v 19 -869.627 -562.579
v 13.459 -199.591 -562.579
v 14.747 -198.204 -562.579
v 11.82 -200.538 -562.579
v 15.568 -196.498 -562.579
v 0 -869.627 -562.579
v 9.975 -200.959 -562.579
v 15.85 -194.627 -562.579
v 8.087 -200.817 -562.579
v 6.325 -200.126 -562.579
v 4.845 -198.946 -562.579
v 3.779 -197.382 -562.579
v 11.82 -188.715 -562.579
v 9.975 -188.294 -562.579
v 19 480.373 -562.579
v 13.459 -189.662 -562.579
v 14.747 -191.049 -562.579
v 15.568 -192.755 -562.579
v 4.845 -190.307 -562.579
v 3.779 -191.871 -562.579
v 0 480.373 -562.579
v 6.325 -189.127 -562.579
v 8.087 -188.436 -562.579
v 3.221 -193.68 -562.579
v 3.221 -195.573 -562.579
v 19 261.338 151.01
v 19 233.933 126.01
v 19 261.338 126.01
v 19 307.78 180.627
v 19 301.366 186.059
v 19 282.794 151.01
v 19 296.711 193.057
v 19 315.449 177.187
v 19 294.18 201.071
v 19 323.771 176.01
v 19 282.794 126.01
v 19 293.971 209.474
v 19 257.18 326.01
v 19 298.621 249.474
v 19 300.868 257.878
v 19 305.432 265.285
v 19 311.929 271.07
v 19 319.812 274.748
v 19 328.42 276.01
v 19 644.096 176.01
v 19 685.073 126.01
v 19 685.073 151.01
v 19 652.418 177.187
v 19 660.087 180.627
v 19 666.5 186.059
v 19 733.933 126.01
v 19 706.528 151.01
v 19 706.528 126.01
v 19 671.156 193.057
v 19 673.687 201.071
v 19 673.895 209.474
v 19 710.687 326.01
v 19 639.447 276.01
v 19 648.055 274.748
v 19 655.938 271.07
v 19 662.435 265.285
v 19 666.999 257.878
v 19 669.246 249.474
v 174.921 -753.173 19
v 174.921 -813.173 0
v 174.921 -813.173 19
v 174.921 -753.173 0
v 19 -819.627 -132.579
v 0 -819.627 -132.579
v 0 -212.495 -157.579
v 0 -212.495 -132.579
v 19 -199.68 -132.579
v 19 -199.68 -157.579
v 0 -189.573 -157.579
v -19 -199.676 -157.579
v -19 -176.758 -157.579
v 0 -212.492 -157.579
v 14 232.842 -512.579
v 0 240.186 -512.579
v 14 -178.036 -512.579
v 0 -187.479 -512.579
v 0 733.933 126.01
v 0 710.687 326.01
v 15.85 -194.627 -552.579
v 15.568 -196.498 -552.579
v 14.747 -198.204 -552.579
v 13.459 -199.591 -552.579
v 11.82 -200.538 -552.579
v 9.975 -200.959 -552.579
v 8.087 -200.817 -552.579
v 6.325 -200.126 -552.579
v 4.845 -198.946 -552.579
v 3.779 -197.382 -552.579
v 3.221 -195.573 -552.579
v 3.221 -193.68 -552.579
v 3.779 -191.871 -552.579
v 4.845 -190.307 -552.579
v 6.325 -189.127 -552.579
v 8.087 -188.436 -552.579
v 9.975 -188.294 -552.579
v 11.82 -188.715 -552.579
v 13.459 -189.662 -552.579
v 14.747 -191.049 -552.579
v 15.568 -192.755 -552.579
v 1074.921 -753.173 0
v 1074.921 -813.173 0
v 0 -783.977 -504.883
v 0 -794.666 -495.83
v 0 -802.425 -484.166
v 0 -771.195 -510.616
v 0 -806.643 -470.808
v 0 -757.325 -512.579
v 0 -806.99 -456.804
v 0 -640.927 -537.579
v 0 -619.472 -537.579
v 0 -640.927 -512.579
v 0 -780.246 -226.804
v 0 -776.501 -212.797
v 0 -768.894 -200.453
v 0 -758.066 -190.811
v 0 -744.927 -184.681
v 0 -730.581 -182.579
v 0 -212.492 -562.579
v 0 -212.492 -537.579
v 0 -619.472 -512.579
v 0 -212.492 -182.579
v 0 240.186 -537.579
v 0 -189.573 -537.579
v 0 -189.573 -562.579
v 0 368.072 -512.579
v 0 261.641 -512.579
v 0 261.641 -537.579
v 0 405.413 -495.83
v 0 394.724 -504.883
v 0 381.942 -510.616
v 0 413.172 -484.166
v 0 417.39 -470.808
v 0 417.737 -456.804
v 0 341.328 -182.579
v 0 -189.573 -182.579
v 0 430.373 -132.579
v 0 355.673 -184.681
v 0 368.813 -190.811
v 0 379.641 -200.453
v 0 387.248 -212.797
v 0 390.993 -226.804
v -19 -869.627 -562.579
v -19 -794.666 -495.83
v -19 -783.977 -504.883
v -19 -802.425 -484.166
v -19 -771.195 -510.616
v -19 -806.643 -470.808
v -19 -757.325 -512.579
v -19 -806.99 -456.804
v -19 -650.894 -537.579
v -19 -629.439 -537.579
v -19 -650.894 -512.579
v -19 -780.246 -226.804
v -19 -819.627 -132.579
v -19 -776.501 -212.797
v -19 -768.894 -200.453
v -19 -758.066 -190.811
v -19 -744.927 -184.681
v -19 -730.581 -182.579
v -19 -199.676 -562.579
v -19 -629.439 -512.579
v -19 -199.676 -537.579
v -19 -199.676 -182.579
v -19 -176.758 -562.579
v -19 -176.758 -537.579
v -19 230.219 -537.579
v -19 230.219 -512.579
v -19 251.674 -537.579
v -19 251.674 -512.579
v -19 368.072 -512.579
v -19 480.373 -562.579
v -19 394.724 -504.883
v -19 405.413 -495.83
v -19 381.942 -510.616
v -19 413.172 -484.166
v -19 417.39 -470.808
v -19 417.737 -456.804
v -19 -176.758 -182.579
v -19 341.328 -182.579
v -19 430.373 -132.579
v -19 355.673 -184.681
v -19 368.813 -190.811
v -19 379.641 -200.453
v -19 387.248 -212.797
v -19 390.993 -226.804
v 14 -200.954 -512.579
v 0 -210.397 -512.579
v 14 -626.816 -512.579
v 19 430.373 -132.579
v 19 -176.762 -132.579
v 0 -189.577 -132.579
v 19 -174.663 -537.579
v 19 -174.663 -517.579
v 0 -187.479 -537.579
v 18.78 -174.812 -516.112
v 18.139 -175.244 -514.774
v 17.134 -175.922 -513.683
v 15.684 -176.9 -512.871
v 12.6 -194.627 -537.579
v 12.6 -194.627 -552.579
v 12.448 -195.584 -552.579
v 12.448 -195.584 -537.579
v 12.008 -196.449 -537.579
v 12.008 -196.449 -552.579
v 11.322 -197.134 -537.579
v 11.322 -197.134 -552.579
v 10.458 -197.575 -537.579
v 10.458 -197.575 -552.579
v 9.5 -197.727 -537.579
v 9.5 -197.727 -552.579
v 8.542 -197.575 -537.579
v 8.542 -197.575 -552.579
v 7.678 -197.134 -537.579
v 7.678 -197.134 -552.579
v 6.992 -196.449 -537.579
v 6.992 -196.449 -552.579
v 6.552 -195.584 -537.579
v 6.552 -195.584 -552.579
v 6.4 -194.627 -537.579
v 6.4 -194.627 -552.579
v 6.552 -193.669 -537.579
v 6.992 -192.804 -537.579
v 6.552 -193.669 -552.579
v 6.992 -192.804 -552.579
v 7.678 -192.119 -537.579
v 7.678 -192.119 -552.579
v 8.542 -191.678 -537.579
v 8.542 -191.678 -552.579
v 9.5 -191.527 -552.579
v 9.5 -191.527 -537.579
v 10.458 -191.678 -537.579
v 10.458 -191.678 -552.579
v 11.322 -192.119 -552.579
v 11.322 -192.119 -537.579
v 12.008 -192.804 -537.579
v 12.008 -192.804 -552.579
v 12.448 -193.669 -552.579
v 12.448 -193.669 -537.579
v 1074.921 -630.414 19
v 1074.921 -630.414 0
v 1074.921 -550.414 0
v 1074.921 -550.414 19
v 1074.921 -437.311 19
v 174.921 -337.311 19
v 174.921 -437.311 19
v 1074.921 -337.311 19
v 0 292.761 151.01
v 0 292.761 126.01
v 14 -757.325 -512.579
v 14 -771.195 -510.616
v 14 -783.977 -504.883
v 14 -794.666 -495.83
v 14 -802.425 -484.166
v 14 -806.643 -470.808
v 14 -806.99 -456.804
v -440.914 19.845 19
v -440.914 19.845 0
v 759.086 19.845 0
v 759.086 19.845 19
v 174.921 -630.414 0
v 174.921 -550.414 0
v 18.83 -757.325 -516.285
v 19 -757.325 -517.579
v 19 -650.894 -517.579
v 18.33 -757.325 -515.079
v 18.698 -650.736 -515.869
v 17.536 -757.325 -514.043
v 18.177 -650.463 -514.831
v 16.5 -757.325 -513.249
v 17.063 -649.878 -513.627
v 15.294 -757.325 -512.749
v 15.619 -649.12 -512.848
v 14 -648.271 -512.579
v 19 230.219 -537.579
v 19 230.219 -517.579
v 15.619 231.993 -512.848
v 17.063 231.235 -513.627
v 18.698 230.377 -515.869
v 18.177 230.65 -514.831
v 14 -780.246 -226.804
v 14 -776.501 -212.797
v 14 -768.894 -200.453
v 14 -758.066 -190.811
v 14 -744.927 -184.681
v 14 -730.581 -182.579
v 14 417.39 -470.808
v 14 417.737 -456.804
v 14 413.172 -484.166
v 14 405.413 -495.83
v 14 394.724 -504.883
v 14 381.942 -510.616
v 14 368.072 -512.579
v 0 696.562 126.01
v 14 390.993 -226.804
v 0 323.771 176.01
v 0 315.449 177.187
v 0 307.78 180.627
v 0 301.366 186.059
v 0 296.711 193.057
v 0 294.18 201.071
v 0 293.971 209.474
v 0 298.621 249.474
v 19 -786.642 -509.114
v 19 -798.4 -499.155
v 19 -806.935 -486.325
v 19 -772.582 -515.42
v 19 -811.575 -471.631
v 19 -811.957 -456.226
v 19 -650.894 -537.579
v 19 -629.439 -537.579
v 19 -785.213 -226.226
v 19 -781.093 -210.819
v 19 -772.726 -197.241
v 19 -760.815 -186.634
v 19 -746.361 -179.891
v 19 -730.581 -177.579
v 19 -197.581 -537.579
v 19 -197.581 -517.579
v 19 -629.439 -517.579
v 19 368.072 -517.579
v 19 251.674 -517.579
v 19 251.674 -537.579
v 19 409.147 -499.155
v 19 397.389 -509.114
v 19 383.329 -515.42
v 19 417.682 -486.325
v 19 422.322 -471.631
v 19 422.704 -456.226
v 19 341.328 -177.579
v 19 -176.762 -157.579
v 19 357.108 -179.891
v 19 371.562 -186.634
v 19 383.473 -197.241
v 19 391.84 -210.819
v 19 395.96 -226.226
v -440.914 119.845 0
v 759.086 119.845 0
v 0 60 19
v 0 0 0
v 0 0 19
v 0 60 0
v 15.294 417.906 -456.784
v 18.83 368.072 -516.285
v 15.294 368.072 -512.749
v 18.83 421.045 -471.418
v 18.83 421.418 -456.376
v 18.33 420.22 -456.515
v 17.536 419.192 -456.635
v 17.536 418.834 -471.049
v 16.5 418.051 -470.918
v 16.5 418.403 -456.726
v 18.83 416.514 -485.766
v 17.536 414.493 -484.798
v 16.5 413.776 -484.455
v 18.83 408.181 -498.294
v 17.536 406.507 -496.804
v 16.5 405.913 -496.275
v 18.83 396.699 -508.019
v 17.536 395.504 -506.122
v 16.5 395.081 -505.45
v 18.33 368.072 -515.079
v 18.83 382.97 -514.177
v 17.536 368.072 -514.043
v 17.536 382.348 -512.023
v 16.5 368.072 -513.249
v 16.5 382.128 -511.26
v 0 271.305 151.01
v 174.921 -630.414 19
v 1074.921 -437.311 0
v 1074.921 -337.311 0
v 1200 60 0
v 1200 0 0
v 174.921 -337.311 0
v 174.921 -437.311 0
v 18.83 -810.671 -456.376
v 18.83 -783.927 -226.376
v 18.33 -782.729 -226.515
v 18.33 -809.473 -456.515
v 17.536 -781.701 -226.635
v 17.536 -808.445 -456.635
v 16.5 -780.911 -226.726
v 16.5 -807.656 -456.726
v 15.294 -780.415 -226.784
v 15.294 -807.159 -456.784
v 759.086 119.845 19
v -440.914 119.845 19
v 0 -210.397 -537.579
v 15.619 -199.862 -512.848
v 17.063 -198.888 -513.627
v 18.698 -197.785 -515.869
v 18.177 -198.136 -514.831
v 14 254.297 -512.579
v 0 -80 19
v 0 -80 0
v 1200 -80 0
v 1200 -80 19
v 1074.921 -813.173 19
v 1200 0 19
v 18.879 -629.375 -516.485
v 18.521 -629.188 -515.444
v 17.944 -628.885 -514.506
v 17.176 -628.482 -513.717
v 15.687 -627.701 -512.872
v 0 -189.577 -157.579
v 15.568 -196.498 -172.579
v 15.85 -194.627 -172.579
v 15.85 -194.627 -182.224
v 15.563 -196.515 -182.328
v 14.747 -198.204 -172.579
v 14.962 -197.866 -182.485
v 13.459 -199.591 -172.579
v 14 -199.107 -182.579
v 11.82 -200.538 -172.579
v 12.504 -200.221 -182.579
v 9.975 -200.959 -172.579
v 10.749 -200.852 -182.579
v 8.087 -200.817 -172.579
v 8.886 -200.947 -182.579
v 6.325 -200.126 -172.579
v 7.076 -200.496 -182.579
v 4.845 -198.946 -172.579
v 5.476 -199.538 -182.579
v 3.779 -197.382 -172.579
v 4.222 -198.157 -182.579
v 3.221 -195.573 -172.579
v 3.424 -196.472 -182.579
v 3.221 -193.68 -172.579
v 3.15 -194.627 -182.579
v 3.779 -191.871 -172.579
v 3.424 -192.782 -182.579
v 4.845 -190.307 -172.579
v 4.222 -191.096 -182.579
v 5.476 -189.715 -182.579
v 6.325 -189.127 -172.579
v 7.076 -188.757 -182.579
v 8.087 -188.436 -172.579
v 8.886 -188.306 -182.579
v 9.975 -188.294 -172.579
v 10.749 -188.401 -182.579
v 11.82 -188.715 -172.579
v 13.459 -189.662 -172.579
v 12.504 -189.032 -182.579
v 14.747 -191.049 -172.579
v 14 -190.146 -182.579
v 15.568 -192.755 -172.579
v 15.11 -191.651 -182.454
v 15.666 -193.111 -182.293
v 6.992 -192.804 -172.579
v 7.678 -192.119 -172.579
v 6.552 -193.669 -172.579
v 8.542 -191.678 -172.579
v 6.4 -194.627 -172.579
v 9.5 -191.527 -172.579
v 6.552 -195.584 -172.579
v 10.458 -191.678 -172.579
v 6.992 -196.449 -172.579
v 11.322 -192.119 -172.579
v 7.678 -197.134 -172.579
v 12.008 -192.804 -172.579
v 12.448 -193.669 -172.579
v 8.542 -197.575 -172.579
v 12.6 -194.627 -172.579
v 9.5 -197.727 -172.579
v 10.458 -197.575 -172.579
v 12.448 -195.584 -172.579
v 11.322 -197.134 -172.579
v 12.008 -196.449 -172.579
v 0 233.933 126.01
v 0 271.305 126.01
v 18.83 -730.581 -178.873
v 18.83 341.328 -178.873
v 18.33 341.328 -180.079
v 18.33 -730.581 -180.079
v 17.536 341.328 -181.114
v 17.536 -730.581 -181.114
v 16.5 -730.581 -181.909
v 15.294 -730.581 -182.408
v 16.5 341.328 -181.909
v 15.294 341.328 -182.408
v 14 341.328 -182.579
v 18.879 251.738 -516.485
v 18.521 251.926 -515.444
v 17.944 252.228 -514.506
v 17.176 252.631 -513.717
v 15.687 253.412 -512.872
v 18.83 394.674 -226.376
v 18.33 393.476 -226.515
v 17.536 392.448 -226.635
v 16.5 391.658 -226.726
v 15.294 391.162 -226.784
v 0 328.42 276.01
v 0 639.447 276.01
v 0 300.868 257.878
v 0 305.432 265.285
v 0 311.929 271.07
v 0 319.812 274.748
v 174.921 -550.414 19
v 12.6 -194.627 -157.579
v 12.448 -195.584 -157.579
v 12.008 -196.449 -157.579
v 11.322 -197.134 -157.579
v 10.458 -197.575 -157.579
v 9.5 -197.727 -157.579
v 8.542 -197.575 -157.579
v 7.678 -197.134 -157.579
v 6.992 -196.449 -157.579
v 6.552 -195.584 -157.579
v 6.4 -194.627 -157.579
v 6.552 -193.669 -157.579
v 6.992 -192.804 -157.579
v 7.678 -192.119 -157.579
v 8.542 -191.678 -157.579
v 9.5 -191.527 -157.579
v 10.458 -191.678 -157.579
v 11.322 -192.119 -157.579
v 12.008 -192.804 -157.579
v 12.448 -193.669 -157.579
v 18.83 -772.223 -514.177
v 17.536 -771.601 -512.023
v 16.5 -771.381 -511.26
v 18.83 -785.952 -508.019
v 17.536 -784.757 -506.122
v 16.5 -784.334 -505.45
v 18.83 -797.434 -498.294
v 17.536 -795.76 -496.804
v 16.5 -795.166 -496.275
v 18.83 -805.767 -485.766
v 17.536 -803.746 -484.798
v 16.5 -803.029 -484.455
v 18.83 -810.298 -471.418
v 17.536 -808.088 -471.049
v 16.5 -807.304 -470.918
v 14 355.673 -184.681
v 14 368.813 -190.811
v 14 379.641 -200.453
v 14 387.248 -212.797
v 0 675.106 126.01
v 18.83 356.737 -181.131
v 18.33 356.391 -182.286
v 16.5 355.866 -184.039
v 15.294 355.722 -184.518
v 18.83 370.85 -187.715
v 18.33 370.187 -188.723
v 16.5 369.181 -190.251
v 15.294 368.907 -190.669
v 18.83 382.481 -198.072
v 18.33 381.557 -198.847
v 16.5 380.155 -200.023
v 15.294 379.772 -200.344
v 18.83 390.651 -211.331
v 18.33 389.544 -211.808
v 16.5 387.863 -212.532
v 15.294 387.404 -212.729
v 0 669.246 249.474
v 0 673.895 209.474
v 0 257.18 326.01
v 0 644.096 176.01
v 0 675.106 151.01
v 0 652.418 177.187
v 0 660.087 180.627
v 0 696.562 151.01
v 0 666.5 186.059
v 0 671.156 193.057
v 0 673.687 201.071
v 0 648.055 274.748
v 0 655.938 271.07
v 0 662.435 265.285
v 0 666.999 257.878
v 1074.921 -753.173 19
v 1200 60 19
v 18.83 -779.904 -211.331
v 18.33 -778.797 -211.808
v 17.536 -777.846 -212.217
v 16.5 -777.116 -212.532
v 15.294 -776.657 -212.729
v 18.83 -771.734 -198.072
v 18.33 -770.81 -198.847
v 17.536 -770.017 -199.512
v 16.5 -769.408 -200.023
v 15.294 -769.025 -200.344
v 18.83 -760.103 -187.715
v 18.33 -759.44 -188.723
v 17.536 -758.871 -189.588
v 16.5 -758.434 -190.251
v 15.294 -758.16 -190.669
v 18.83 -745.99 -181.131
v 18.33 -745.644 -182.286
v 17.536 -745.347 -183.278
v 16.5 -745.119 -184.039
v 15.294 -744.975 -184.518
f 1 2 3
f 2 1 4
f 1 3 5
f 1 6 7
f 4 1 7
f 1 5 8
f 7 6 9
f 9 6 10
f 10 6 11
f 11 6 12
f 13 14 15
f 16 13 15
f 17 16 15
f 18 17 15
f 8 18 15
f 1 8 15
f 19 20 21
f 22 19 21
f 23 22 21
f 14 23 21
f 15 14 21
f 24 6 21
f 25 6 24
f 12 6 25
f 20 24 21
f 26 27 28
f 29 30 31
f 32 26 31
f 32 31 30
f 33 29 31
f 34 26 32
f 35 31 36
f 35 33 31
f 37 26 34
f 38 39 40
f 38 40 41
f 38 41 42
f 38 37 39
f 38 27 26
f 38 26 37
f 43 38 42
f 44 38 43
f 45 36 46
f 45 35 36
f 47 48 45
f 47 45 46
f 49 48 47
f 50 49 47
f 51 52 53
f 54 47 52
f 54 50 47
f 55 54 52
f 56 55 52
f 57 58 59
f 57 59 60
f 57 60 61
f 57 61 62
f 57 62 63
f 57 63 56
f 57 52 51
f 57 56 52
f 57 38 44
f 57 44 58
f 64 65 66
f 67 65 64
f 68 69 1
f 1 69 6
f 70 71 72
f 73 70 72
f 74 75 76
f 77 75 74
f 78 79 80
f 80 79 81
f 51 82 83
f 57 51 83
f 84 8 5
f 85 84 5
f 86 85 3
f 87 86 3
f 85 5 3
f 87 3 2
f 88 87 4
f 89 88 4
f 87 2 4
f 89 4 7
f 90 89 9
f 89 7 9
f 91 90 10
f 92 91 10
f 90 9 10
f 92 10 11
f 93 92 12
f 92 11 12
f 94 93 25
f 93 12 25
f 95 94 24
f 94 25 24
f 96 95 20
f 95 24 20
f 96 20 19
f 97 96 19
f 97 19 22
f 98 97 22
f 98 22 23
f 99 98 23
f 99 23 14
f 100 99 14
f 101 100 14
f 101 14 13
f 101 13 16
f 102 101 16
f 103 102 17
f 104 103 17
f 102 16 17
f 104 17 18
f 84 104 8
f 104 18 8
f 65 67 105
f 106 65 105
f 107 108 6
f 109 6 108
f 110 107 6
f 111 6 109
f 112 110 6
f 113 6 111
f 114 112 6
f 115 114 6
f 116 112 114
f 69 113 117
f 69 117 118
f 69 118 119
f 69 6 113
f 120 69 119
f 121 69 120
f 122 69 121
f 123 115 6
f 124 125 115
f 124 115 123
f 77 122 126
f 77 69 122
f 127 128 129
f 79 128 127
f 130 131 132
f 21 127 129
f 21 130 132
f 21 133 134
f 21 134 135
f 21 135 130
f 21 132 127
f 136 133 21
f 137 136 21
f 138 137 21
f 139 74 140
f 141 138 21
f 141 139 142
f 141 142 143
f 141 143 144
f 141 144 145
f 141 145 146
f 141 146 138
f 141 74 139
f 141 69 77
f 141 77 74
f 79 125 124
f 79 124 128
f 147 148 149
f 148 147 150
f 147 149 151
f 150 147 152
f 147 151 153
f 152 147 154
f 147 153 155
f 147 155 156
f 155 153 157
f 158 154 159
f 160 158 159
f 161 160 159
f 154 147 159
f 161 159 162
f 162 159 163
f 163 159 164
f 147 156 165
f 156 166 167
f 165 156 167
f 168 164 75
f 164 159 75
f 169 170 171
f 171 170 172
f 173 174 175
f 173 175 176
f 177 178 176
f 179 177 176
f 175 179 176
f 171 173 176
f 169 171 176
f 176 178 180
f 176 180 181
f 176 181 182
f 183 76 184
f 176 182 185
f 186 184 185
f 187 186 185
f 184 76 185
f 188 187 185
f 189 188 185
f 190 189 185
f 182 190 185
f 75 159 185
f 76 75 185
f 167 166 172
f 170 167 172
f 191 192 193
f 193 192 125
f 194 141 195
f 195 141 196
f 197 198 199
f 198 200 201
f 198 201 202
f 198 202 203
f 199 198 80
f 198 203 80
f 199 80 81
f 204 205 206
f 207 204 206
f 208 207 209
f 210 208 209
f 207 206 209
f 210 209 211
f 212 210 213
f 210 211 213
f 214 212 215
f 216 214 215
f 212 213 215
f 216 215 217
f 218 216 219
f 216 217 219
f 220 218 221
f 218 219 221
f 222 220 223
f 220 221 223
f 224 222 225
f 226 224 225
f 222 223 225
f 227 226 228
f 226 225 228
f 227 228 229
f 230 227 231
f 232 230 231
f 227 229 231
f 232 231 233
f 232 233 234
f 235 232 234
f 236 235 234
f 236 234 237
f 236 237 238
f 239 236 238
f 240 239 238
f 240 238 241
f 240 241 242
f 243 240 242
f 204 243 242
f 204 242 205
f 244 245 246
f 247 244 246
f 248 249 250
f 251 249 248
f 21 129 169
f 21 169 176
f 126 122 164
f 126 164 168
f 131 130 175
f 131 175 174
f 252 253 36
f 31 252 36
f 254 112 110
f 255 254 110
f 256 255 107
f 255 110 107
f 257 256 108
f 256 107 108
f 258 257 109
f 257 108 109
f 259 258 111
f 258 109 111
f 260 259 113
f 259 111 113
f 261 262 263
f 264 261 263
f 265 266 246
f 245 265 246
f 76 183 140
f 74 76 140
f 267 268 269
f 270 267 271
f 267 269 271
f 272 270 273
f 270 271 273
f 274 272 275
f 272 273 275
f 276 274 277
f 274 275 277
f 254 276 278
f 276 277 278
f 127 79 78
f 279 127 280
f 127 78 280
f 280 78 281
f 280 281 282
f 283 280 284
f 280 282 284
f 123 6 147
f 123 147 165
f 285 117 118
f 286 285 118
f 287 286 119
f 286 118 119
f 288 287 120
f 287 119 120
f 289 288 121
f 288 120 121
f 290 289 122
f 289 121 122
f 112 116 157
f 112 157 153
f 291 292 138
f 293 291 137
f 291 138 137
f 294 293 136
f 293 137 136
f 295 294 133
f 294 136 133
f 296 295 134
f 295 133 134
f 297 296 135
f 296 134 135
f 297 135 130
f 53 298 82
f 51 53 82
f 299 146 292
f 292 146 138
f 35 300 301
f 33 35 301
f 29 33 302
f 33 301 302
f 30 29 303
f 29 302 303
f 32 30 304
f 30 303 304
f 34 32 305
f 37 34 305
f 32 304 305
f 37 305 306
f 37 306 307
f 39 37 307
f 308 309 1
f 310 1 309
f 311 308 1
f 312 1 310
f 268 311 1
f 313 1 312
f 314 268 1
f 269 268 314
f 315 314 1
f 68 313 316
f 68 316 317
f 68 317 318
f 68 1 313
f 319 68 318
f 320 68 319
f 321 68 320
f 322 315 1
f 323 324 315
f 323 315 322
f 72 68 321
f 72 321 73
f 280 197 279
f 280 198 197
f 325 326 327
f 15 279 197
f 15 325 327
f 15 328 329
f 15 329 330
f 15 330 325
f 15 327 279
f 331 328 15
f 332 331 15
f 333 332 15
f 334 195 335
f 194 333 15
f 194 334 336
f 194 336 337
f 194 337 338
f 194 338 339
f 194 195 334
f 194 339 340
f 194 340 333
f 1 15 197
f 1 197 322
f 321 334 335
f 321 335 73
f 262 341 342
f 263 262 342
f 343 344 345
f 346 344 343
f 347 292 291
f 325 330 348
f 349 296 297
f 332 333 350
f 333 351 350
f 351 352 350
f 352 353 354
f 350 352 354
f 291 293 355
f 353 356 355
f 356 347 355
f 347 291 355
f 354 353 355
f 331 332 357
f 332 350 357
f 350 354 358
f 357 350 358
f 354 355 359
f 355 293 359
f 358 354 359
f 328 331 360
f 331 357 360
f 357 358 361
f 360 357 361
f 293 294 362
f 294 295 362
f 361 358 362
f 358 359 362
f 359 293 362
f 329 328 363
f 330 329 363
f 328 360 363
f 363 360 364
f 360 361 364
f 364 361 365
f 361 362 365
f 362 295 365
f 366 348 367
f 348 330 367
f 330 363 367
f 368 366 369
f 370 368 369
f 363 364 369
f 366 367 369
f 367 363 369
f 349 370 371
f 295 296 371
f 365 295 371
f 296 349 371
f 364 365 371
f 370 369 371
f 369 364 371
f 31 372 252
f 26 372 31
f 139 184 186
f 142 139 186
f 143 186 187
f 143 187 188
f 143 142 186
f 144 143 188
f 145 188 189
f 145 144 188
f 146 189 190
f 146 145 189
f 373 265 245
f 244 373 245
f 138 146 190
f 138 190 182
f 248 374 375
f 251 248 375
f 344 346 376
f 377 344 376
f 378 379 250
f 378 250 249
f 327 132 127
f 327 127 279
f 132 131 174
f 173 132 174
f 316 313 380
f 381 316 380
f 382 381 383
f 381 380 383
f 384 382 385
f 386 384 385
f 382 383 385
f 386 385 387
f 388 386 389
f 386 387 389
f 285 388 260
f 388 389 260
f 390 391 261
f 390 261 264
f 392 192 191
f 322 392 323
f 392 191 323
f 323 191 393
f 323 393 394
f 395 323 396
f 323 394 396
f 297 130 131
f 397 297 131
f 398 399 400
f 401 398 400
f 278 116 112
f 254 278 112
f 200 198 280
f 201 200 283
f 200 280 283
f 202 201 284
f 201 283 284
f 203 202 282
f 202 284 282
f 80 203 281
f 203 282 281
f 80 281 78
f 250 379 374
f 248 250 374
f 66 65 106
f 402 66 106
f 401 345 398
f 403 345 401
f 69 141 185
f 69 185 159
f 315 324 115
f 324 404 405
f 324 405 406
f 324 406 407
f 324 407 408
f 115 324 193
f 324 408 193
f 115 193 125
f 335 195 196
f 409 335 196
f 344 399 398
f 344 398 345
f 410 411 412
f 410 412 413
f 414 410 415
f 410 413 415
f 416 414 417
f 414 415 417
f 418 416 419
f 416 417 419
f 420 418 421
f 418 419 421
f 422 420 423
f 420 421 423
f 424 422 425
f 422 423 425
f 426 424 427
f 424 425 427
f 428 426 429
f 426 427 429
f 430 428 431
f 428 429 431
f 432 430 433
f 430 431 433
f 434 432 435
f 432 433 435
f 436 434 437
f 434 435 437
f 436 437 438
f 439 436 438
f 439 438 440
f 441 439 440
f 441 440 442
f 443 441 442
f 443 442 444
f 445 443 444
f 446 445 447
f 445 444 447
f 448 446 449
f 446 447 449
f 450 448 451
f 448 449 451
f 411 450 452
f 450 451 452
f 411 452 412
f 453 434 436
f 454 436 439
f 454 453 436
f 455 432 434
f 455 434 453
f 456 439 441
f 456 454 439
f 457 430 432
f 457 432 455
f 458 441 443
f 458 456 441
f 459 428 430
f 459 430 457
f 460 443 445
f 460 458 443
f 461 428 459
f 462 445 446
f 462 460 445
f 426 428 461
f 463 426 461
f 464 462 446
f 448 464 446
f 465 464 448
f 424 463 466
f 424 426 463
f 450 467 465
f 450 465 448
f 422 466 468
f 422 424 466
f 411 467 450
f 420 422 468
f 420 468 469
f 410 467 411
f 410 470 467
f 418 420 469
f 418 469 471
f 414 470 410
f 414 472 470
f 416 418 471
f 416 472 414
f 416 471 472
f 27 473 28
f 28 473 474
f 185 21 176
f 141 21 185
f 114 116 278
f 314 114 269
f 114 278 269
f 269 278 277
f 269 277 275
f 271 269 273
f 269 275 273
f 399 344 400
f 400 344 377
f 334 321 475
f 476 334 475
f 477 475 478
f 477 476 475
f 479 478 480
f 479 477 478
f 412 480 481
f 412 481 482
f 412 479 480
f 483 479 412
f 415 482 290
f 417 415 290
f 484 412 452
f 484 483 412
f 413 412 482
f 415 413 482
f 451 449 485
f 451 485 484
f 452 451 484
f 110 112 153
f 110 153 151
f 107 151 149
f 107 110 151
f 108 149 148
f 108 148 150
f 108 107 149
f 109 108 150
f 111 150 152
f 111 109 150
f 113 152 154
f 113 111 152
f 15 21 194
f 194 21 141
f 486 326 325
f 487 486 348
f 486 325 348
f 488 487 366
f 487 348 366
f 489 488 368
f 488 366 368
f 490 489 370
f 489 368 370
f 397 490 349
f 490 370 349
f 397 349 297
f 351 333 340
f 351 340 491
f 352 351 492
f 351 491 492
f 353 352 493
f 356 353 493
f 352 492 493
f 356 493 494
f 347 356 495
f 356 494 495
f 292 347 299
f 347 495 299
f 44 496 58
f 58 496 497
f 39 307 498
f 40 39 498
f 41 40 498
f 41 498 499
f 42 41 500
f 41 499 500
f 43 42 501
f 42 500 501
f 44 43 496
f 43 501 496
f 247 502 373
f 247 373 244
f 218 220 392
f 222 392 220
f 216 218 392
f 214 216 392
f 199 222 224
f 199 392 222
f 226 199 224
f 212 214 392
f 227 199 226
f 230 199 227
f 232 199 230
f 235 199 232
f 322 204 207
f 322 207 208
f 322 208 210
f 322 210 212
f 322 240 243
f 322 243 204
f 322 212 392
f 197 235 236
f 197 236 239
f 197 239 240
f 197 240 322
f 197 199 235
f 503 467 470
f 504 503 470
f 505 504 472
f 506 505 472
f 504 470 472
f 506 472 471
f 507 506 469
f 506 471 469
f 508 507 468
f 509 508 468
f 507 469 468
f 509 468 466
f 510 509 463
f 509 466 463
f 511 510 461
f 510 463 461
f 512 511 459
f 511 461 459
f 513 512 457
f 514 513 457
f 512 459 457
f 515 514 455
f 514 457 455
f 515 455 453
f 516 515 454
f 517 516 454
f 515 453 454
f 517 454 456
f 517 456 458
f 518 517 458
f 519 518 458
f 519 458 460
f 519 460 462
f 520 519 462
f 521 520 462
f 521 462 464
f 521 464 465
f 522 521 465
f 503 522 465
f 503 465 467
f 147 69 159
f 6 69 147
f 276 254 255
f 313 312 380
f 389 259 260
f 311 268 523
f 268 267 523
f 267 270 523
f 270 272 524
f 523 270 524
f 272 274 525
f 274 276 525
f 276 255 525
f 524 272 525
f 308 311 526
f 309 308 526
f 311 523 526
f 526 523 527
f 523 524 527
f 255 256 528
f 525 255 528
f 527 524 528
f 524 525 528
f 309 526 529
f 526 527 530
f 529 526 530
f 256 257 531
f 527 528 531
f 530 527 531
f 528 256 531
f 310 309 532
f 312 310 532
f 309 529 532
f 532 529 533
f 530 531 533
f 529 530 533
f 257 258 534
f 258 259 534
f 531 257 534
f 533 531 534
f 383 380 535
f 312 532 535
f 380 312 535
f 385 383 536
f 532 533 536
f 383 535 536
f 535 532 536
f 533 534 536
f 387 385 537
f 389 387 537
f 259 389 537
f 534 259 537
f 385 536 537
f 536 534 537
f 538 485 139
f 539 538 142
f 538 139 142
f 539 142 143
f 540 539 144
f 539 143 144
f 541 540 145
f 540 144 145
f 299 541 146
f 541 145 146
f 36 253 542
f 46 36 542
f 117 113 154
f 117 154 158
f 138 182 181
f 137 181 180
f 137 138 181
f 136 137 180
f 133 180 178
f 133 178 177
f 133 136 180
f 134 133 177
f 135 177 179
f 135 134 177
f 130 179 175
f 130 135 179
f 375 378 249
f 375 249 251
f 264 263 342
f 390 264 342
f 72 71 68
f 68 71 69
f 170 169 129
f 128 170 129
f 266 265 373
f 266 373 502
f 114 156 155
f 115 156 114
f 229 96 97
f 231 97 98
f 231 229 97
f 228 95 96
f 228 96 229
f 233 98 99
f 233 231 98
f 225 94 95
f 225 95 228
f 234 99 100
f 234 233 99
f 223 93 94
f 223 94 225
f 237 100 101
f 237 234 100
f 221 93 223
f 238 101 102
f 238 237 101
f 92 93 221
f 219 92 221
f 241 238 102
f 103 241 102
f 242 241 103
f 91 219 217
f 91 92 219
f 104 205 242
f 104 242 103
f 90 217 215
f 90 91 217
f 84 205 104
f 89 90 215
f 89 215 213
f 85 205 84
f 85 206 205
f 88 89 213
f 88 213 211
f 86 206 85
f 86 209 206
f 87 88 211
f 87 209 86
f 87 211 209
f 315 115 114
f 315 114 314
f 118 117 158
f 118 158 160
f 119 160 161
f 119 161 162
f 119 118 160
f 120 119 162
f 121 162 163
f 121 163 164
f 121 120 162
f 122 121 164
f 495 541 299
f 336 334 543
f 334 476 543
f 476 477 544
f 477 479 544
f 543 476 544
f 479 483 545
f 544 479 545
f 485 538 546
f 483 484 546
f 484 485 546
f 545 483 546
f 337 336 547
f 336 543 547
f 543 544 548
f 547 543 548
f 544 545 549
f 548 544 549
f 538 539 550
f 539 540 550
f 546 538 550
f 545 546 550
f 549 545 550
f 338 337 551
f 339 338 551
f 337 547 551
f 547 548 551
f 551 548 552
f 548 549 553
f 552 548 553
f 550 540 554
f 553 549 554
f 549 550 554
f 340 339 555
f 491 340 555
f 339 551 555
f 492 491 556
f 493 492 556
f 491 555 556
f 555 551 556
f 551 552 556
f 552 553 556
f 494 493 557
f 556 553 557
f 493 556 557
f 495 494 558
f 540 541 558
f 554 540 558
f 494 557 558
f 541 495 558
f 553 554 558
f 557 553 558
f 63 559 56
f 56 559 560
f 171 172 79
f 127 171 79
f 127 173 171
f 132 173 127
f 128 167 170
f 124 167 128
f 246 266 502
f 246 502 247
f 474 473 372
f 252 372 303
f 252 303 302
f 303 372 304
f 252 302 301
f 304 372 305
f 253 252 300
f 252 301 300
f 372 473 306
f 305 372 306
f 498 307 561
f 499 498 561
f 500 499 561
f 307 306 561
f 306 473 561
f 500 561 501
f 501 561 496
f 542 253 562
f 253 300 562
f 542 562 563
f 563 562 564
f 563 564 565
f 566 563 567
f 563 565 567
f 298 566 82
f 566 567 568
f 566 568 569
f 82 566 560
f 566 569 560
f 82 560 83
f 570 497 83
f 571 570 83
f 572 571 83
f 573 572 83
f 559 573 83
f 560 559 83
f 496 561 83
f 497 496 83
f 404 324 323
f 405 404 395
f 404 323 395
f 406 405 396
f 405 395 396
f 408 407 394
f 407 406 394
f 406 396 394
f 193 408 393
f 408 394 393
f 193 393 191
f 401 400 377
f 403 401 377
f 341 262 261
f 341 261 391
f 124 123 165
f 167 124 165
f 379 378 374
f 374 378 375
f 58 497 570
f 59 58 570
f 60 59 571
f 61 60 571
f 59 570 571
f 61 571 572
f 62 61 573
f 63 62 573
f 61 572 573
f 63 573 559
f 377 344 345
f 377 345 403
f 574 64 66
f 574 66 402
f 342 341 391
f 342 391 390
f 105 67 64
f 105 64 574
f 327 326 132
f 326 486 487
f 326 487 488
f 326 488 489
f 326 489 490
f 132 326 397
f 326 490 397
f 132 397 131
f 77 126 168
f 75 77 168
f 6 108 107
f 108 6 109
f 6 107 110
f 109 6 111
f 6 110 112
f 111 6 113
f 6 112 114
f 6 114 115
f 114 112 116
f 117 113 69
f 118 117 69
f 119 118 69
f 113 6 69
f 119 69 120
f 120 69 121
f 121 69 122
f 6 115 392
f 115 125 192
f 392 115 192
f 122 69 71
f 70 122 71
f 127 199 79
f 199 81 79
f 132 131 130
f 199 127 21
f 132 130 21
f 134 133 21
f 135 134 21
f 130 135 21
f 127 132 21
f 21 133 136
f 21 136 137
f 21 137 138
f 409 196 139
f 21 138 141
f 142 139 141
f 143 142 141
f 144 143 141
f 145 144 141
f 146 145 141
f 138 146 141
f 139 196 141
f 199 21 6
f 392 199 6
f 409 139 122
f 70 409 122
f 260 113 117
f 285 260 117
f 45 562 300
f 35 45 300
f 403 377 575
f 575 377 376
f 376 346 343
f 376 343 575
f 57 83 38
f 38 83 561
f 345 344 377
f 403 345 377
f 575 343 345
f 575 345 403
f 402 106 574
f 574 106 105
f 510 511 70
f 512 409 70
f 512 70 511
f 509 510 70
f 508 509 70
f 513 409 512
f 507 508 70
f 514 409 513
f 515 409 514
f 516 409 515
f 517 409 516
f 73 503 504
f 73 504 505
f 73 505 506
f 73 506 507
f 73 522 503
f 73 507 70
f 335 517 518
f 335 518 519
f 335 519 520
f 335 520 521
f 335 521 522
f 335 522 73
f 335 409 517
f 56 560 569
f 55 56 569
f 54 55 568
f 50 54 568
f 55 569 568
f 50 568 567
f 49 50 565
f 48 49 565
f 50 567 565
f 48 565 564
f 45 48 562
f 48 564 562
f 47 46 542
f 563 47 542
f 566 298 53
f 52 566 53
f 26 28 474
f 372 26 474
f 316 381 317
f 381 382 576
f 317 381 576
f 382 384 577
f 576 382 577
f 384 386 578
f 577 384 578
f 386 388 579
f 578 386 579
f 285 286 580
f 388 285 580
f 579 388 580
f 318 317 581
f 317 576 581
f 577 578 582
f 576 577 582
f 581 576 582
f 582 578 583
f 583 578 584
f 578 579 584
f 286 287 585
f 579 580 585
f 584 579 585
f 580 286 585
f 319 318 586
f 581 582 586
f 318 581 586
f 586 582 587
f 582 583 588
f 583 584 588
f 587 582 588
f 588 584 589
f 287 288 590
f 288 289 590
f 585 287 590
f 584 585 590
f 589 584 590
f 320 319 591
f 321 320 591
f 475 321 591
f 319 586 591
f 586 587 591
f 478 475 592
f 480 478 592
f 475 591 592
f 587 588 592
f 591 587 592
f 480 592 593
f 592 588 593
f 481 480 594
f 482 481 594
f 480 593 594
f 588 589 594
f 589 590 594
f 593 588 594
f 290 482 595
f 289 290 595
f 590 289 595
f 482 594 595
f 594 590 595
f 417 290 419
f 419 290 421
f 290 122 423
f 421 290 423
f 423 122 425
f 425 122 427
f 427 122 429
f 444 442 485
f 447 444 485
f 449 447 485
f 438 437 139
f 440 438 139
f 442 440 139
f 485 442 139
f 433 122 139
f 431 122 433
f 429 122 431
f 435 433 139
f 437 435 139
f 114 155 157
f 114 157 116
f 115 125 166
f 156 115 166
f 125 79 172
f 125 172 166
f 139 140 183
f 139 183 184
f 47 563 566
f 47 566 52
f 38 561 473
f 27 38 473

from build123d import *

# Parameters (mm, degrees)
F0_W          = 1200
F0_H          = 60
F1_DEPTH      = 19
F2_W          = 1200
F2_H          = 80
F3_DEPTH      = 19
F4_W          = 1200
F4_H          = 100
F5_DEPTH      = 19
F7_DEPTH      = 19
F8_DEPTH      = 19
F10_DEPTH     = 25
F12_DEPTH     = 25
F14_DEPTH     = 25
F16_DEPTH     = 25
F18_R         = 6.35
F19_DEPTH     = 10
F20_R         = 3.1
F21_DEPTH     = 571.5798048431
F22_R         = 6.35
F22_R_2       = 3.1
F23_DEPTH     = 10
F24_R         = 6.35
F25_DEPTH     = 10
F27_DEPTH     = 25
F28_DEPTH     = 25
F30_DEPTH     = 19
F32_DEPTH     = 25
F33_W         = 900
F33_H         = 60
F34_DEPTH     = 19
F33_H_2       = 80
F35_DEPTH     = 19
F33_H_3       = 100
F36_DEPTH     = 19
F37_T1_DEPTH  = 456.85740495
F37_T3_DEPTH  = 429.8821422275
F37_T5_DEPTH  = 128.89740651
F37_T7_DEPTH  = 118.9306462831
F37_T9_DEPTH  = 231.5496739088
F37_T11_DEPTH = 1071.9082714241
F37_T13_DEPTH = 231.5496739088
F37_T16_ANGLE = 96.6325146151
F37_T18_ANGLE = 83.3674853849
F37_T20_ANGLE = 83.3674853849
F37_T22_ANGLE = 96.6325146151


# Not quite as in the source:
# - a fillet or chamfer that OpenCascade refuses, or shapes differently, is made with other operations: its cross-section is extruded or revolved along the edge and cut away or added
# - a feature names something its author has since deleted; it is built from what else it names


with BuildPart() as f1:
    # F0 (on Top) → F1 (new body)
    with BuildSketch(Plane.XY):
        with Locations((600, 30)):
            Rectangle(F0_W, F0_H)
    extrude(amount=F1_DEPTH)

    # F24 (on face) → F25 (cut)
    with BuildSketch(Plane(origin=(0, 0, -182.5788048431), x_dir=(1, 0, 0), z_dir=(0, 0, -1))):
        with Locations((9.5, 194.6265311424)):
            Circle(F24_R)
    extrude(amount=-F25_DEPTH, mode=Mode.SUBTRACT)


with BuildPart() as f3:
    # F2 (on Top) → F3 (new body)
    with BuildSketch(Plane.XY):
        with Locations((600, -40)):
            Rectangle(F2_W, F2_H)
    extrude(amount=F3_DEPTH)


with BuildPart() as f5:
    # F4 (on Top) → F5 (new body)
    with BuildSketch(Plane.XY):
        with Locations((159.0859787539, 69.8453307072)):
            Rectangle(F4_W, F4_H)
    extrude(amount=F5_DEPTH)


with BuildPart() as f7:
    # F6 (on Right) → F7 (new body)
    with BuildSketch(Plane.YZ):
        Polygon((430.3734688576, -132.5788048431), (-819.6265311424, -132.5788048431), (-869.6265311424, -562.5788048431), (480.3734688576, -562.5788048431), align=None)
        with BuildLine():
            ThreePointArc((-780.2460358695, -226.8037619344), (-763.8315905601, -195.2374594909), (-730.5806668544, -182.5788048431))
            Line((-730.5806668544, -182.5788048431), (341.3276045696, -182.5788048431))
            ThreePointArc((341.3276045696, -182.5788048431), (374.5785282753, -195.2374594909), (390.9929735847, -226.8037619344))
            Line((390.9929735847, -226.8037619344), (417.7371596312, -456.8037619344))
            ThreePointArc((417.7371596312, -456.8037619344), (405.4131359684, -495.8297285488), (368.0717906162, -512.5788048431))
            Line((368.0717906162, -512.5788048431), (-757.3248529009, -512.5788048431))
            ThreePointArc((-757.3248529009, -512.5788048431), (-794.6661982532, -495.8297285488), (-806.990221916, -456.8037619344))
            Line((-806.990221916, -456.8037619344), (-780.2460358695, -226.8037619344))
        make_face(mode=Mode.SUBTRACT)
    extrude(amount=F7_DEPTH)

    # F9 (on face) → F10 (cut)
    with BuildSketch(Plane.XY.offset(-132.5788048431)):
        Polygon((19, -176.7615311424), (0, -189.5771929624), (0, -212.495333984), (19, -199.679672164), align=None)
    extrude(amount=-F10_DEPTH, mode=Mode.SUBTRACT)

    # F11 (on face) → F12 (cut)
    with BuildSketch(Plane.XY.offset(-512.5788048431)):
        Polygon((45.0043368484, -157.1230627047), (-59.9762402534, -227.9333560629), (-53.8986982225, -246.7521432232), (55.6290020144, -172.8747765833), align=None)
    extrude(amount=-F12_DEPTH, mode=Mode.SUBTRACT)

    # F18 (on face) → F19 (cut)
    with BuildSketch(Plane(origin=(0, 0, -562.5788048431), x_dir=(1, 0, 0), z_dir=(0, 0, -1))):
        with Locations((9.5, 194.6265311424)):
            Circle(F18_R)
    extrude(amount=-F19_DEPTH, mode=Mode.SUBTRACT)

    # F20 (on face) → F21 (cut, through all)
    with BuildSketch(Plane(origin=(0, 0, -552.5788048431), x_dir=(1, 0, 0), z_dir=(0, 0, -1))):
        with Locations((9.5, 194.6265311424)):
            Circle(F20_R)
    extrude(amount=-F21_DEPTH, mode=Mode.SUBTRACT)

    # F22 (on face) → F23 (cut)
    with BuildSketch(Plane(origin=(0, 0, -182.5788048431), x_dir=(1, 0, 0), z_dir=(0, 0, -1))):
        with Locations((9.5, 194.6265311424)):
            Circle(F22_R)
        with Locations((9.5, 194.6265311424)):
            Circle(F22_R_2, mode=Mode.SUBTRACT)
    extrude(amount=-F23_DEPTH, mode=Mode.SUBTRACT)


with BuildPart() as f8:
    # F6 (on Right) → F8 (new body)
    with BuildSketch(Plane.YZ):
        Polygon((430.3734688576, -132.5788048431), (-819.6265311424, -132.5788048431), (-869.6265311424, -562.5788048431), (480.3734688576, -562.5788048431), align=None)
        with BuildLine():
            ThreePointArc((-780.2460358695, -226.8037619344), (-763.8315905601, -195.2374594909), (-730.5806668544, -182.5788048431))
            Line((-730.5806668544, -182.5788048431), (341.3276045696, -182.5788048431))
            ThreePointArc((341.3276045696, -182.5788048431), (374.5785282753, -195.2374594909), (390.9929735847, -226.8037619344))
            Line((390.9929735847, -226.8037619344), (417.7371596312, -456.8037619344))
            ThreePointArc((417.7371596312, -456.8037619344), (405.4131359684, -495.8297285488), (368.0717906162, -512.5788048431))
            Line((368.0717906162, -512.5788048431), (-757.3248529009, -512.5788048431))
            ThreePointArc((-757.3248529009, -512.5788048431), (-794.6661982532, -495.8297285488), (-806.990221916, -456.8037619344))
            Line((-806.990221916, -456.8037619344), (-780.2460358695, -226.8037619344))
        make_face(mode=Mode.SUBTRACT)
    extrude(amount=-F8_DEPTH)

    # F13 (on face) → F14 (cut)
    with BuildSketch(Plane(origin=(0, 0, -562.5788048431), x_dir=(1, 0, 0), z_dir=(0, 0, -1))):
        Polygon((0, 212.4915311424), (-19, 199.6758693224), (-19, 176.7577283008), (0, 189.5733901208), align=None)
    extrude(amount=-F14_DEPTH, mode=Mode.SUBTRACT)

    # F15 (on face) → F16 (cut)
    with BuildSketch(Plane(origin=(0, 0, -182.5788048431), x_dir=(1, 0, 0), z_dir=(0, 0, -1))):
        Polygon((0, 212.4915311424), (-19, 199.6758693224), (-19, 176.7577283008), (0, 189.5733901208), align=None)
    extrude(amount=-F16_DEPTH, mode=Mode.SUBTRACT)


with BuildPart() as f27_tool:
    # F26 (on face) → F27 (new body)
    with BuildSketch(Plane.XY.offset(-512.5788048431)):
        Polygon((0, -619.4719911424), (0, -640.9274424049), (19, -650.8942066179), (19, -629.4387553554), align=None)
        Polygon((-87.6130647374, -686.8863244162), (0, -640.9274424049), (0, -619.4719911424), (-87.6130647374, -665.4308731537), align=None)
        Polygon((0, 261.6411483192), (0, 240.1856970567), (19, 230.2189328437), (19, 251.6743841062), align=None)
    extrude(amount=-F27_DEPTH)


with BuildPart() as f7_1:
    add(f7.part)

    # F27: cut by f27_tool
    add(f27_tool.part, mode=Mode.SUBTRACT)

    # F37: fillet of radius 5 on 11 edges, made by hand

    # F37_s2 → F37_t1 (cut)
    with BuildSketch(Plane.XZ.offset(185.0813504054)):
        with BuildLine():
            ThreePointArc((19, -517.5788048431), (17.5355339059, -514.0432709372), (14, -512.5788048431))
            Line((14, -512.5788048431), (19, -512.5788048431))
            Line((19, -512.5788048431), (19, -517.5788048431))
        make_face()
    extrude(amount=F37_T1_DEPTH, mode=Mode.SUBTRACT)

    # F37_s4 → F37_t3 (cut)
    with BuildSketch(Plane.XZ.offset(-242.7189328437)):
        with BuildLine():
            ThreePointArc((19, -517.5788048431), (17.5355339059, -514.0432709372), (14, -512.5788048431))
            Line((14, -512.5788048431), (19, -512.5788048431))
            Line((19, -512.5788048431), (19, -517.5788048431))
        make_face()
    extrude(amount=F37_T3_DEPTH, mode=Mode.SUBTRACT)

    # F37_s6 → F37_t5 (cut)
    with BuildSketch(Plane.XZ.offset(-368.0717906162)):
        with BuildLine():
            ThreePointArc((19, -517.5788048431), (17.5355339059, -514.0432709372), (14, -512.5788048431))
            Line((14, -512.5788048431), (19, -512.5788048431))
            Line((19, -512.5788048431), (19, -517.5788048431))
        make_face()
    extrude(amount=F37_T5_DEPTH, mode=Mode.SUBTRACT)

    # F37_s8 → F37_t7 (cut)
    with BuildSketch(Plane.XZ.offset(638.3942066179)):
        with BuildLine():
            ThreePointArc((19, -517.5788048431), (17.5355339059, -514.0432709372), (14, -512.5788048431))
            Line((14, -512.5788048431), (19, -512.5788048431))
            Line((19, -512.5788048431), (19, -517.5788048431))
        make_face()
    extrude(amount=F37_T7_DEPTH, mode=Mode.SUBTRACT)

    # F37_s10 → F37_t9 (cut)
    with BuildSketch(Plane(origin=(0, 31.2367306059, -268.635883211), x_dir=(1, 0, 0), z_dir=(0, 0.1155008582, -0.9933073803))):
        with BuildLine():
            ThreePointArc((19, -367.180177167), (17.5355339059, -363.644643261), (14, -362.180177167))
            Line((14, -362.180177167), (19, -362.180177167))
            Line((19, -362.180177167), (19, -367.180177167))
        make_face()
    extrude(amount=F37_T9_DEPTH, mode=Mode.SUBTRACT)

    # F37_s12 → F37_t11 (cut)
    with BuildSketch(Plane.XZ.offset(-341.3276045696)):
        with BuildLine():
            ThreePointArc((19, -177.5788048431), (17.5355339059, -181.1143387491), (14, -182.5788048431))
            Line((14, -182.5788048431), (19, -182.5788048431))
            Line((19, -182.5788048431), (19, -177.5788048431))
        make_face()
    extrude(amount=F37_T11_DEPTH, mode=Mode.SUBTRACT)

    # F37_s14 → F37_t13 (cut)
    with BuildSketch(Plane(origin=(0, -63.1737269817, -543.294052043), x_dir=(1, 0, 0), z_dir=(0, 0.1155008582, 0.9933073803))):
        with BuildLine():
            ThreePointArc((19, -753.8281167393), (17.5355339059, -750.2925828334), (14, -748.8281167393))
            Line((14, -748.8281167393), (19, -748.8281167393))
            Line((19, -748.8281167393), (19, -753.8281167393))
        make_face()
    extrude(amount=F37_T13_DEPTH, mode=Mode.SUBTRACT)

    # F37_s15 → F37_t16 (revolve, cut)
    with BuildSketch(Plane(origin=(0, 57.9809166524, -498.635883211), x_dir=(1, 0, 0), z_dir=(0, -0.1155008582, 0.9933073803))):
        with BuildLine():
            ThreePointArc((19, 367.180177167), (17.5355339059, 363.644643261), (14, 362.180177167))
            Line((14, 362.180177167), (19, 362.180177167))
            Line((19, 362.180177167), (19, 367.180177167))
        make_face()
    revolve(axis=Axis((19, 368.0717906162, -462.5788048431), (-1, 0, 0)), revolution_arc=F37_T16_ANGLE, mode=Mode.SUBTRACT)

    # F37_s17 → F37_t18 (revolve, cut)
    with BuildSketch(Plane.XZ.offset(-341.3276045696)):
        with BuildLine():
            ThreePointArc((19, -177.5788048431), (17.5355339059, -181.1143387491), (14, -182.5788048431))
            Line((14, -182.5788048431), (19, -182.5788048431))
            Line((19, -182.5788048431), (19, -177.5788048431))
        make_face()
    revolve(axis=Axis((19, 341.3276045696, -232.5788048431), (-1, 0, 0)), revolution_arc=F37_T18_ANGLE, mode=Mode.SUBTRACT)

    # F37_s19 → F37_t20 (revolve, cut)
    with BuildSketch(Plane(origin=(0, -36.4295409352, -313.294052043), x_dir=(1, 0, 0), z_dir=(0, -0.1155008582, -0.9933073803))):
        with BuildLine():
            ThreePointArc((19, 753.8281167393), (17.5355339059, 750.2925828334), (14, 748.8281167393))
            Line((14, 748.8281167393), (19, 748.8281167393))
            Line((19, 748.8281167393), (19, 753.8281167393))
        make_face()
    revolve(axis=Axis((19, -730.5806668544, -232.5788048431), (-1, 0, 0)), revolution_arc=F37_T20_ANGLE, mode=Mode.SUBTRACT)

    # F37_s21 → F37_t22 (revolve, cut)
    with BuildSketch(Plane.XZ.offset(757.3248529009)):
        with BuildLine():
            ThreePointArc((19, -517.5788048431), (17.5355339059, -514.0432709372), (14, -512.5788048431))
            Line((14, -512.5788048431), (19, -512.5788048431))
            Line((19, -512.5788048431), (19, -517.5788048431))
        make_face()
    revolve(axis=Axis((19, -757.3248529009, -462.5788048431), (-1, 0, 0)), revolution_arc=F37_T22_ANGLE, mode=Mode.SUBTRACT)


with BuildPart() as f8_1:
    add(f8.part)

    # F27: cut by f27_tool
    add(f27_tool.part, mode=Mode.SUBTRACT)

    # F26 (on face) → F28 (cut)
    with BuildSketch(Plane.XY.offset(-512.5788048431)):
        Polygon((0, -619.4719911424), (0, -640.9274424049), (87.6130647374, -686.8863244162), (87.6130647374, -665.4308731537), align=None)
        Polygon((-87.6130647374, -686.8863244162), (0, -640.9274424049), (0, -619.4719911424), (-87.6130647374, -665.4308731537), align=None)
        Polygon((0, 261.6411483192), (0, 240.1856970567), (19, 230.2189328437), (19, 251.6743841062), align=None)
        Polygon((-19, 230.2189328437), (0, 240.1856970567), (0, 261.6411483192), (-19, 251.6743841062), align=None)
    extrude(amount=-F28_DEPTH, mode=Mode.SUBTRACT)


with BuildPart() as f30:
    # F29 (on Right) → F30 (new body)
    with BuildSketch(Plane.YZ):
        Polygon((257.1804102281, 326.0098321468), (233.9334925731, 126.0098321468), (733.9334925731, 126.0098321468), (710.6865749182, 326.0098321468), align=None)
        with BuildLine():
            Line((328.4202492434, 276.0098321468), (639.4467359028, 276.0098321468))
            ThreePointArc((639.4467359028, 276.0098321468), (659.3977817761, 268.4142015546), (669.2461093573, 249.4735500511))
            Line((669.2461093573, 249.4735500511), (673.8954928883, 209.4735500511))
            ThreePointArc((673.8954928883, 209.4735500511), (666.5004888417, 186.0587862735), (644.0961194338, 176.0098321468))
            Line((644.0961194338, 176.0098321468), (323.7708657124, 176.0098321468))
            ThreePointArc((323.7708657124, 176.0098321468), (301.3664963045, 186.0587862735), (293.9714922579, 209.4735500511))
            Line((293.9714922579, 209.4735500511), (298.6208757889, 249.4735500511))
            ThreePointArc((298.6208757889, 249.4735500511), (308.4692033701, 268.4142015546), (328.4202492434, 276.0098321468))
        make_face(mode=Mode.SUBTRACT)
    extrude(amount=F30_DEPTH)

    # F31 (on face) → F32 (cut)
    with BuildSketch(Plane(origin=(0, 0, 126.0098321468), x_dir=(1, 0, 0), z_dir=(0, 0, -1))):
        Polygon((19, -282.7939438356), (19, -261.3384925731), (0, -271.3052567861), (0, -292.7607080486), align=None)
        Polygon((19, -706.5284925731), (19, -685.0730413106), (0, -675.1062770976), (0, -696.5617283601), align=None)
    extrude(amount=-F32_DEPTH, mode=Mode.SUBTRACT)


with BuildPart() as f34:
    # F33 (on Top) → F34 (new body)
    with BuildSketch(Plane.XY):
        with Locations((624.9209493399, -783.1725859803)):
            Rectangle(F33_W, F33_H)
    extrude(amount=F34_DEPTH)


with BuildPart() as f35:
    # F33 (on Top) → F35 (new body)
    with BuildSketch(Plane.XY):
        with Locations((624.9209493399, -590.4139791311)):
            Rectangle(F33_W, F33_H_2)
    extrude(amount=F35_DEPTH)


with BuildPart() as f36:
    # F33 (on Top) → F36 (new body)
    with BuildSketch(Plane.XY):
        with Locations((624.9209493399, -387.3105144983)):
            Rectangle(F33_W, F33_H_3)
    extrude(amount=F36_DEPTH)


solid = Compound([f1.part, f3.part, f5.part, f7_1.part, f8_1.part, f30.part, f34.part, f35.part, f36.part])
